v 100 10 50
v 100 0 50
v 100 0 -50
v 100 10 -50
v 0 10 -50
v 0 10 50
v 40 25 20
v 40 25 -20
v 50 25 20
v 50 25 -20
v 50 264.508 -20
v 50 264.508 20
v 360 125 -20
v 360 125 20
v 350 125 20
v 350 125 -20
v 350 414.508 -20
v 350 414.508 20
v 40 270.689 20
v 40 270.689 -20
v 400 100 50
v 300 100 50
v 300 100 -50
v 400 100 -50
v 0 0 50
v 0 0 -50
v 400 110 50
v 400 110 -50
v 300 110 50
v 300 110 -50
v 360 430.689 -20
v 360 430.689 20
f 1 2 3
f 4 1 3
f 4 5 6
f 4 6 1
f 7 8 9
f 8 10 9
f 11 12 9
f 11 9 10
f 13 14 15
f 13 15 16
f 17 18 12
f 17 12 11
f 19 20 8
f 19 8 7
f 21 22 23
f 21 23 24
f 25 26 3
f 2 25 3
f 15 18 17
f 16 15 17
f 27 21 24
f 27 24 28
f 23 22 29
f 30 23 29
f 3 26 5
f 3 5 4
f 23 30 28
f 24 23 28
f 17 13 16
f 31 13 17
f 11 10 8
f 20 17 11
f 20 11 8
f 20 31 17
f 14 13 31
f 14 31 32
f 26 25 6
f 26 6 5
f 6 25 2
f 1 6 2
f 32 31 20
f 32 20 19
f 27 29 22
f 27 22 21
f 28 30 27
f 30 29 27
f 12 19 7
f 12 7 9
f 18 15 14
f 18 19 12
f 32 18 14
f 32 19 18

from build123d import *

# Parameters (mm, degrees)
SKIZZE1_W                       = 100
SKIZZE1_H                       = 100
AUFSATZ_LINEAR_AUSTRAGEN1_DEPTH = 10
SKIZZE2_W                       = 100
SKIZZE2_H                       = 10
AUFSATZ_LINEAR_AUSTRAGEN2_DEPTH = 50
SKIZZE5_W                       = 10
SKIZZE5_H                       = 40


with BuildPart() as part:
    # Skizze1 → Aufsatz-Linear austragen1 (new body)
    with BuildSketch(Plane(origin=(0, 0, 0), x_dir=(1, 0, 0), z_dir=(0, 1, 0))):
        with Locations((50, 0)):
            Rectangle(SKIZZE1_W, SKIZZE1_H)
    extrude(amount=AUFSATZ_LINEAR_AUSTRAGEN1_DEPTH)


with BuildPart() as body_2:
    # Skizze2 → Aufsatz-Linear austragen2 (new body, symmetric)
    with BuildSketch(Plane.XY):
        with Locations((350, 105)):
            Rectangle(SKIZZE2_W, SKIZZE2_H)
    extrude(amount=AUFSATZ_LINEAR_AUSTRAGEN2_DEPTH, both=True)


with BuildPart() as body_3:
    # Austragung2: sweep along a path in Skizze3
    with BuildLine(Plane.XY) as austragung2_path:
        Line((50, 25), (50, 264.508497187))
        Line((50, 264.508497187), (350, 414.508497187))
        Line((350, 414.508497187), (350, 125))
    # Skizze5 → Austragung2 (sweep)
    with BuildSketch(Plane(origin=(0, 25, 0), x_dir=(1, 0, 0), z_dir=(0, 1, 0))):
        with Locations((45, 0)):
            Rectangle(SKIZZE5_W, SKIZZE5_H)
    sweep(path=austragung2_path.line, transition=Transition.RIGHT)


solid = Compound([part.part, body_2.part, body_3.part])
